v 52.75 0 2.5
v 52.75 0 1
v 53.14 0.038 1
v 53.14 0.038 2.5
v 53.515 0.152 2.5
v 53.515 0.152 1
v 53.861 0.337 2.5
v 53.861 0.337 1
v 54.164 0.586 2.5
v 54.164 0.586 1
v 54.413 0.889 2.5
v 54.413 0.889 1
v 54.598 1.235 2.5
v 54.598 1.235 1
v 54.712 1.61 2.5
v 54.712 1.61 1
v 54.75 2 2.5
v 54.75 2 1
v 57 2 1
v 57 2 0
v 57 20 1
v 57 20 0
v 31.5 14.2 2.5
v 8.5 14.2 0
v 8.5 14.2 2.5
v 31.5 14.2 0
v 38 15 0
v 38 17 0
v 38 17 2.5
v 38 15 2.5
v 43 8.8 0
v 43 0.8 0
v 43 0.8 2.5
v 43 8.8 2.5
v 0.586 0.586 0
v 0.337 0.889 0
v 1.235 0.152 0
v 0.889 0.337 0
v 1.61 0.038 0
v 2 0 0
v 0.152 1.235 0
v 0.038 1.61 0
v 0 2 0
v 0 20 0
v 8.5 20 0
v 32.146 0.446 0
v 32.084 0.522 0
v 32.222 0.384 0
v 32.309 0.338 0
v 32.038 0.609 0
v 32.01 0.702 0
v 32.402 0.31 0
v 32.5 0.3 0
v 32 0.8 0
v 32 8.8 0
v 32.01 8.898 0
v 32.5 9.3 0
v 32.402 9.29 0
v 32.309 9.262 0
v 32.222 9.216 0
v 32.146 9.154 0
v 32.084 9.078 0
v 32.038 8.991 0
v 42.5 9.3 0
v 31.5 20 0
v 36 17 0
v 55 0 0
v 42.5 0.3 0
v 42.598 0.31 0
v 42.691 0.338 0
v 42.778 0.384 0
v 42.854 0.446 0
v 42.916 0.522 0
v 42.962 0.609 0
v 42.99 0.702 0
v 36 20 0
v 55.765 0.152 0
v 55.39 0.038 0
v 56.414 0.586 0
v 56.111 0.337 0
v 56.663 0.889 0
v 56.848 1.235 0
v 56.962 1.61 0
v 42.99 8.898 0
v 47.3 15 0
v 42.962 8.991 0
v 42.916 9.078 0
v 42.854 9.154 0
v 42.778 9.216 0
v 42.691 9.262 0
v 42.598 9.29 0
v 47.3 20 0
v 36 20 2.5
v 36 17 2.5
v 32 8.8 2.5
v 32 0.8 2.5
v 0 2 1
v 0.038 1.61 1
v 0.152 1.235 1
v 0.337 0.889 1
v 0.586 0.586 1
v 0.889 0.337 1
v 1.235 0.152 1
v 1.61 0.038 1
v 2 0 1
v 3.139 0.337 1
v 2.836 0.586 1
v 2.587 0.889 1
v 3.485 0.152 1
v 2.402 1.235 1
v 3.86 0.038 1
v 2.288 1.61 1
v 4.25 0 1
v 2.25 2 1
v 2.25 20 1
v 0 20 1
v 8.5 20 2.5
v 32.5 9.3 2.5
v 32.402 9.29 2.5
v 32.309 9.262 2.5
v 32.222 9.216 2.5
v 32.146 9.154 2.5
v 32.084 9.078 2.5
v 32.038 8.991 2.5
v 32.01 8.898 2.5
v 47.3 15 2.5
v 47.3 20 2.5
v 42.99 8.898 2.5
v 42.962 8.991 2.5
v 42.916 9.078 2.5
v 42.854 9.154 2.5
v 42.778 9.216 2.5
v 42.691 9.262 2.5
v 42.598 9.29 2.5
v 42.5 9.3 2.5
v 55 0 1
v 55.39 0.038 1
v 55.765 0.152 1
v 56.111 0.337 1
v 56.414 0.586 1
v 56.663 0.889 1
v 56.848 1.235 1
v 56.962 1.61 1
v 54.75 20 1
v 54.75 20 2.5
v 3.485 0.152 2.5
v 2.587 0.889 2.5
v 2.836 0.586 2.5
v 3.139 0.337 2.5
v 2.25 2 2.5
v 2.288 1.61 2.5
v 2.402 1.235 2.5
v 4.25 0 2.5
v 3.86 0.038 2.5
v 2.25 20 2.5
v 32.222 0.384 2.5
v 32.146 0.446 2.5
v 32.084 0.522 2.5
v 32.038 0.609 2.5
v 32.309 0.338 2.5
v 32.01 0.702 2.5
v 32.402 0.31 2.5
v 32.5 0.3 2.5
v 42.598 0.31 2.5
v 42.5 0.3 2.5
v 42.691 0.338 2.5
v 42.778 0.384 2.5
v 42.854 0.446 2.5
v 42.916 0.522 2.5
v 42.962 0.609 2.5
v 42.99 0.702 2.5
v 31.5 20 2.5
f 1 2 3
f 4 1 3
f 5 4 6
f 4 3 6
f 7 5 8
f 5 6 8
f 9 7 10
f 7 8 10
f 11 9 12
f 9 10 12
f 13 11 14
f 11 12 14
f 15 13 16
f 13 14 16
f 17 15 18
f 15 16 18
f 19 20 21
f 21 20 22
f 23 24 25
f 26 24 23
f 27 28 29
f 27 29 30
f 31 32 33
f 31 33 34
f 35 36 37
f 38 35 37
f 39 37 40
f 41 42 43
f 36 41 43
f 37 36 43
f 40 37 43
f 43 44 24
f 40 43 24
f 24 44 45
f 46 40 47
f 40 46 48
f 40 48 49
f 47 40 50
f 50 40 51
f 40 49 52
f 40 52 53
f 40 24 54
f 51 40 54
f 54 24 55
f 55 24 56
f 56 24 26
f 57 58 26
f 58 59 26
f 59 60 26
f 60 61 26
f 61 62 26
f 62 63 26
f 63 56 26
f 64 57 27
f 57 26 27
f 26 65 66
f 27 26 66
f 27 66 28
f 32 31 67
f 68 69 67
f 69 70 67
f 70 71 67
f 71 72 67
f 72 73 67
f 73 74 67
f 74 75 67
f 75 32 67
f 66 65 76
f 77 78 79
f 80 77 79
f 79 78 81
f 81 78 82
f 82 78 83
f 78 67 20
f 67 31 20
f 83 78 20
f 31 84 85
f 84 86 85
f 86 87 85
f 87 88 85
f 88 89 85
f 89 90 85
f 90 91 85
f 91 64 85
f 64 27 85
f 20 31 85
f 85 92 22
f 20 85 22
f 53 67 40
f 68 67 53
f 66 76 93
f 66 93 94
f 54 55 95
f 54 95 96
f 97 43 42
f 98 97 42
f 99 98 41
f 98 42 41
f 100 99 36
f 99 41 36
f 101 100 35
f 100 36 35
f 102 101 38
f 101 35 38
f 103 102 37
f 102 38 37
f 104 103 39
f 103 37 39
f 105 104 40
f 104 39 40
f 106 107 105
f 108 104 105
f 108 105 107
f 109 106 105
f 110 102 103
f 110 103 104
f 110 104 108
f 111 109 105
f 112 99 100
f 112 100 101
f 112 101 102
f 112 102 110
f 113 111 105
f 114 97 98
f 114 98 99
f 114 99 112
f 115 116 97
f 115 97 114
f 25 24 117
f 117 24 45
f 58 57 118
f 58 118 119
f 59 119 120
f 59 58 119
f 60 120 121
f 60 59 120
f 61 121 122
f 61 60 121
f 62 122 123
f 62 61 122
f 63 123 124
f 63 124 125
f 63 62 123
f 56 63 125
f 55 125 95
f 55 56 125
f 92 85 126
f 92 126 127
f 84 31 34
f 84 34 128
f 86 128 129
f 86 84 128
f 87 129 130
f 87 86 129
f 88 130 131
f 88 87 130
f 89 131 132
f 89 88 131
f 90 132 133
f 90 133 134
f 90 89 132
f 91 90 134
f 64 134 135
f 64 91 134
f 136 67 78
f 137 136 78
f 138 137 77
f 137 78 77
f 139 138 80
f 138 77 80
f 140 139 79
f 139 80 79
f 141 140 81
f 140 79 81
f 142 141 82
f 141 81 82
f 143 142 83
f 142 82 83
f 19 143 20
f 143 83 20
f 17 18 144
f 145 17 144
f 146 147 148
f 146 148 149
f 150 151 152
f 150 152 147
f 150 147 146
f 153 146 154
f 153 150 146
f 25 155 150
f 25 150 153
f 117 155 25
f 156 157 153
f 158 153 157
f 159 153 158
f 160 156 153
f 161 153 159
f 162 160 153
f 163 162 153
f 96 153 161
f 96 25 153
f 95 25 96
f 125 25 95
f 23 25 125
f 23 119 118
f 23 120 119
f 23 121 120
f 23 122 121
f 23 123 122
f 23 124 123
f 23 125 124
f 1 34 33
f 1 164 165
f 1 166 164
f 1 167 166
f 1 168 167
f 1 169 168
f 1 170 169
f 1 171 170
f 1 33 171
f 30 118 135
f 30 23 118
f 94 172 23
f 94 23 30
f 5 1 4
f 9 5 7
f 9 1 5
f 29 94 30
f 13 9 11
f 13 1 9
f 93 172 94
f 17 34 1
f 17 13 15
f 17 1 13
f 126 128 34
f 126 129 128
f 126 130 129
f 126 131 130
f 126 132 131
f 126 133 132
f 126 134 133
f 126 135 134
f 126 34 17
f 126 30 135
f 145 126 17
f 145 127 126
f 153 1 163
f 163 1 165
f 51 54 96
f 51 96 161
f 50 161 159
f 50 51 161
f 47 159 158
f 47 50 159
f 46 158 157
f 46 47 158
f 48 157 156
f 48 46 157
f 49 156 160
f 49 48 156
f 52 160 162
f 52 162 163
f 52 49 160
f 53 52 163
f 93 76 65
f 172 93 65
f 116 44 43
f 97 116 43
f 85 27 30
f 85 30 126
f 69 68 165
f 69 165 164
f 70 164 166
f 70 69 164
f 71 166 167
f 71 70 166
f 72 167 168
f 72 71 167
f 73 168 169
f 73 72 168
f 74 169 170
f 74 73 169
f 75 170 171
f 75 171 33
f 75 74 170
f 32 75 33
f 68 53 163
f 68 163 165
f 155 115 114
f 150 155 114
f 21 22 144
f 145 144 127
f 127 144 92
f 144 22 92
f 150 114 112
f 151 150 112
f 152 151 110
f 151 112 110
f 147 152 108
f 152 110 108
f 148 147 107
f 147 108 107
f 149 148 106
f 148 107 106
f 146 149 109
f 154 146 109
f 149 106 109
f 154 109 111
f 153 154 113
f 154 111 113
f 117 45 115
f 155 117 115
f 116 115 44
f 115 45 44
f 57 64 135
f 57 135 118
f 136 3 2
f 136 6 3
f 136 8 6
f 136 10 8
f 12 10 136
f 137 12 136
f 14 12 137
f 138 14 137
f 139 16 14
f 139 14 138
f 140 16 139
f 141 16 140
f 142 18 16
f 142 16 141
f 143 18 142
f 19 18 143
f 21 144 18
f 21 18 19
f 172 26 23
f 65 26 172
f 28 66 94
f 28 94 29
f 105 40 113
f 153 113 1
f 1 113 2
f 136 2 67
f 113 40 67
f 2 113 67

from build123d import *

# Parameters (mm, degrees)
F1_DEPTH = 1
F3_DEPTH = 1.5
F4_W     = 23
F4_H     = 5.8
F5_DEPTH = 2.5


with BuildPart() as f1:
    # F0 (on Top) → F1 (new body)
    with BuildSketch(Plane.XY):
        with BuildLine():
            ThreePointArc((0, 2), (0.585786, 0.585786), (2, 0))
            Line((2, 0), (55, 0))
            ThreePointArc((55, 0), (56.414214, 0.585786), (57, 2))
            Line((57, 2), (57, 20))
            Line((57, 20), (0, 20))
            Line((0, 20), (0, 2))
        make_face()
    extrude(amount=F1_DEPTH)

    # F2 (on face) → F3 (join)
    with BuildSketch(Plane.XY.offset(1)):
        with BuildLine():
            Line((54.75, 20), (2.25, 20))
            Line((2.25, 20), (2.25, 2))
            ThreePointArc((2.25, 2), (2.835786, 0.585786), (4.25, 0))
            Line((4.25, 0), (52.75, 0))
            ThreePointArc((52.75, 0), (54.164214, 0.585786), (54.75, 2))
            Line((54.75, 2), (54.75, 20))
        make_face()
    extrude(amount=F3_DEPTH)

    # F4 (on face) → F5 (cut, through all)
    with BuildSketch(Plane.XY):
        with Locations((20, 17.1)):
            Rectangle(F4_W, F4_H)
        Polygon((47.3, 20), (36, 20), (36, 17), (38, 17), (38, 15), (47.3, 15), align=None)
        with BuildLine():
            Line((42.5, 9.3), (32.5, 9.3))
            ThreePointArc((32.5, 9.3), (32.146447, 9.153553), (32, 8.8))
            Line((32, 8.8), (32, 0.8))
            ThreePointArc((32, 0.8), (32.146447, 0.446447), (32.5, 0.3))
            Line((32.5, 0.3), (42.5, 0.3))
            ThreePointArc((42.5, 0.3), (42.853553, 0.446447), (43, 0.8))
            Line((43, 0.8), (43, 8.8))
            ThreePointArc((43, 8.8), (42.853553, 9.153553), (42.5, 9.3))
        make_face()
    extrude(amount=F5_DEPTH, mode=Mode.SUBTRACT)


solid = f1.part
